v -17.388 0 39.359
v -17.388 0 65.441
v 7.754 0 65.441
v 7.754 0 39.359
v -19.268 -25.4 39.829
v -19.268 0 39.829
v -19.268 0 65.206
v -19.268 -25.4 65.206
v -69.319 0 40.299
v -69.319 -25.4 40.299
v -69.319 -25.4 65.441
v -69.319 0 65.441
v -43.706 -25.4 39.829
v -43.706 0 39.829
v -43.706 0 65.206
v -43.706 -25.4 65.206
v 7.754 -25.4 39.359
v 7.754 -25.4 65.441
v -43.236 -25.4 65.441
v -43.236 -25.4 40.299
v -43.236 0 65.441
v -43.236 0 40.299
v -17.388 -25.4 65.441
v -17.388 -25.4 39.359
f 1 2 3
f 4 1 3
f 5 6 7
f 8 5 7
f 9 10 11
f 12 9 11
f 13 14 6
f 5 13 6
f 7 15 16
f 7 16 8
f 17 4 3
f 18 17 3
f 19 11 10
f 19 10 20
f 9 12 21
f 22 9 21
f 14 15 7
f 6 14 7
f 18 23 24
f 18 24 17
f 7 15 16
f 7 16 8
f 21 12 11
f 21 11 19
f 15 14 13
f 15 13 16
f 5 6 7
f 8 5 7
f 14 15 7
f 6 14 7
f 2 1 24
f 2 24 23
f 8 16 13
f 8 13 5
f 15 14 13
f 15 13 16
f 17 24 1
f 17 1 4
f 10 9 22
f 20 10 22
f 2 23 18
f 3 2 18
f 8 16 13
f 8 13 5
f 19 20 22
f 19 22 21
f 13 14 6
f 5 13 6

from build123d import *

# Parameters (mm, degrees)
F0_W     = 26.0825566947
F0_H     = 25.142647326
F2_DEPTH = 25.4
F1_W     = 24.4377087802
F1_H     = 25.3776162863
F3_DEPTH = 25.4
F4_W     = 25.1426440664
F4_H     = 26.08256042
F5_DEPTH = 25.4


with BuildPart() as f2:
    # F0 (on Front) → F2 (new body)
    with BuildSketch(Plane.XZ):
        with Locations((-56.277224794, 52.8700463474)):
            Rectangle(F0_W, F0_H)
    extrude(amount=F2_DEPTH)


with BuildPart() as f2b:
    # F1 (on Front) → F2, piece 2 (new body)
    with BuildSketch(Plane.XZ):
        with Locations((-31.4870486036, 52.5175780058)):
            Rectangle(F1_W, F1_H)
    extrude(amount=F2_DEPTH)


with BuildPart() as f3:
    # F1 (on Front) → F3 (new body)
    with BuildSketch(Plane.XZ):
        with Locations((-31.4870486036, 52.5175780058)):
            Rectangle(F1_W, F1_H)
    extrude(amount=F3_DEPTH)


with BuildPart() as f5:
    # F4 (on Front) → F5 (new body)
    with BuildSketch(Plane.XZ):
        with Locations((-4.8170478549, 52.4000898004)):
            Rectangle(F4_W, F4_H)
    extrude(amount=F5_DEPTH)


solid = Compound([f2.part, f2b.part, f3.part, f5.part])
